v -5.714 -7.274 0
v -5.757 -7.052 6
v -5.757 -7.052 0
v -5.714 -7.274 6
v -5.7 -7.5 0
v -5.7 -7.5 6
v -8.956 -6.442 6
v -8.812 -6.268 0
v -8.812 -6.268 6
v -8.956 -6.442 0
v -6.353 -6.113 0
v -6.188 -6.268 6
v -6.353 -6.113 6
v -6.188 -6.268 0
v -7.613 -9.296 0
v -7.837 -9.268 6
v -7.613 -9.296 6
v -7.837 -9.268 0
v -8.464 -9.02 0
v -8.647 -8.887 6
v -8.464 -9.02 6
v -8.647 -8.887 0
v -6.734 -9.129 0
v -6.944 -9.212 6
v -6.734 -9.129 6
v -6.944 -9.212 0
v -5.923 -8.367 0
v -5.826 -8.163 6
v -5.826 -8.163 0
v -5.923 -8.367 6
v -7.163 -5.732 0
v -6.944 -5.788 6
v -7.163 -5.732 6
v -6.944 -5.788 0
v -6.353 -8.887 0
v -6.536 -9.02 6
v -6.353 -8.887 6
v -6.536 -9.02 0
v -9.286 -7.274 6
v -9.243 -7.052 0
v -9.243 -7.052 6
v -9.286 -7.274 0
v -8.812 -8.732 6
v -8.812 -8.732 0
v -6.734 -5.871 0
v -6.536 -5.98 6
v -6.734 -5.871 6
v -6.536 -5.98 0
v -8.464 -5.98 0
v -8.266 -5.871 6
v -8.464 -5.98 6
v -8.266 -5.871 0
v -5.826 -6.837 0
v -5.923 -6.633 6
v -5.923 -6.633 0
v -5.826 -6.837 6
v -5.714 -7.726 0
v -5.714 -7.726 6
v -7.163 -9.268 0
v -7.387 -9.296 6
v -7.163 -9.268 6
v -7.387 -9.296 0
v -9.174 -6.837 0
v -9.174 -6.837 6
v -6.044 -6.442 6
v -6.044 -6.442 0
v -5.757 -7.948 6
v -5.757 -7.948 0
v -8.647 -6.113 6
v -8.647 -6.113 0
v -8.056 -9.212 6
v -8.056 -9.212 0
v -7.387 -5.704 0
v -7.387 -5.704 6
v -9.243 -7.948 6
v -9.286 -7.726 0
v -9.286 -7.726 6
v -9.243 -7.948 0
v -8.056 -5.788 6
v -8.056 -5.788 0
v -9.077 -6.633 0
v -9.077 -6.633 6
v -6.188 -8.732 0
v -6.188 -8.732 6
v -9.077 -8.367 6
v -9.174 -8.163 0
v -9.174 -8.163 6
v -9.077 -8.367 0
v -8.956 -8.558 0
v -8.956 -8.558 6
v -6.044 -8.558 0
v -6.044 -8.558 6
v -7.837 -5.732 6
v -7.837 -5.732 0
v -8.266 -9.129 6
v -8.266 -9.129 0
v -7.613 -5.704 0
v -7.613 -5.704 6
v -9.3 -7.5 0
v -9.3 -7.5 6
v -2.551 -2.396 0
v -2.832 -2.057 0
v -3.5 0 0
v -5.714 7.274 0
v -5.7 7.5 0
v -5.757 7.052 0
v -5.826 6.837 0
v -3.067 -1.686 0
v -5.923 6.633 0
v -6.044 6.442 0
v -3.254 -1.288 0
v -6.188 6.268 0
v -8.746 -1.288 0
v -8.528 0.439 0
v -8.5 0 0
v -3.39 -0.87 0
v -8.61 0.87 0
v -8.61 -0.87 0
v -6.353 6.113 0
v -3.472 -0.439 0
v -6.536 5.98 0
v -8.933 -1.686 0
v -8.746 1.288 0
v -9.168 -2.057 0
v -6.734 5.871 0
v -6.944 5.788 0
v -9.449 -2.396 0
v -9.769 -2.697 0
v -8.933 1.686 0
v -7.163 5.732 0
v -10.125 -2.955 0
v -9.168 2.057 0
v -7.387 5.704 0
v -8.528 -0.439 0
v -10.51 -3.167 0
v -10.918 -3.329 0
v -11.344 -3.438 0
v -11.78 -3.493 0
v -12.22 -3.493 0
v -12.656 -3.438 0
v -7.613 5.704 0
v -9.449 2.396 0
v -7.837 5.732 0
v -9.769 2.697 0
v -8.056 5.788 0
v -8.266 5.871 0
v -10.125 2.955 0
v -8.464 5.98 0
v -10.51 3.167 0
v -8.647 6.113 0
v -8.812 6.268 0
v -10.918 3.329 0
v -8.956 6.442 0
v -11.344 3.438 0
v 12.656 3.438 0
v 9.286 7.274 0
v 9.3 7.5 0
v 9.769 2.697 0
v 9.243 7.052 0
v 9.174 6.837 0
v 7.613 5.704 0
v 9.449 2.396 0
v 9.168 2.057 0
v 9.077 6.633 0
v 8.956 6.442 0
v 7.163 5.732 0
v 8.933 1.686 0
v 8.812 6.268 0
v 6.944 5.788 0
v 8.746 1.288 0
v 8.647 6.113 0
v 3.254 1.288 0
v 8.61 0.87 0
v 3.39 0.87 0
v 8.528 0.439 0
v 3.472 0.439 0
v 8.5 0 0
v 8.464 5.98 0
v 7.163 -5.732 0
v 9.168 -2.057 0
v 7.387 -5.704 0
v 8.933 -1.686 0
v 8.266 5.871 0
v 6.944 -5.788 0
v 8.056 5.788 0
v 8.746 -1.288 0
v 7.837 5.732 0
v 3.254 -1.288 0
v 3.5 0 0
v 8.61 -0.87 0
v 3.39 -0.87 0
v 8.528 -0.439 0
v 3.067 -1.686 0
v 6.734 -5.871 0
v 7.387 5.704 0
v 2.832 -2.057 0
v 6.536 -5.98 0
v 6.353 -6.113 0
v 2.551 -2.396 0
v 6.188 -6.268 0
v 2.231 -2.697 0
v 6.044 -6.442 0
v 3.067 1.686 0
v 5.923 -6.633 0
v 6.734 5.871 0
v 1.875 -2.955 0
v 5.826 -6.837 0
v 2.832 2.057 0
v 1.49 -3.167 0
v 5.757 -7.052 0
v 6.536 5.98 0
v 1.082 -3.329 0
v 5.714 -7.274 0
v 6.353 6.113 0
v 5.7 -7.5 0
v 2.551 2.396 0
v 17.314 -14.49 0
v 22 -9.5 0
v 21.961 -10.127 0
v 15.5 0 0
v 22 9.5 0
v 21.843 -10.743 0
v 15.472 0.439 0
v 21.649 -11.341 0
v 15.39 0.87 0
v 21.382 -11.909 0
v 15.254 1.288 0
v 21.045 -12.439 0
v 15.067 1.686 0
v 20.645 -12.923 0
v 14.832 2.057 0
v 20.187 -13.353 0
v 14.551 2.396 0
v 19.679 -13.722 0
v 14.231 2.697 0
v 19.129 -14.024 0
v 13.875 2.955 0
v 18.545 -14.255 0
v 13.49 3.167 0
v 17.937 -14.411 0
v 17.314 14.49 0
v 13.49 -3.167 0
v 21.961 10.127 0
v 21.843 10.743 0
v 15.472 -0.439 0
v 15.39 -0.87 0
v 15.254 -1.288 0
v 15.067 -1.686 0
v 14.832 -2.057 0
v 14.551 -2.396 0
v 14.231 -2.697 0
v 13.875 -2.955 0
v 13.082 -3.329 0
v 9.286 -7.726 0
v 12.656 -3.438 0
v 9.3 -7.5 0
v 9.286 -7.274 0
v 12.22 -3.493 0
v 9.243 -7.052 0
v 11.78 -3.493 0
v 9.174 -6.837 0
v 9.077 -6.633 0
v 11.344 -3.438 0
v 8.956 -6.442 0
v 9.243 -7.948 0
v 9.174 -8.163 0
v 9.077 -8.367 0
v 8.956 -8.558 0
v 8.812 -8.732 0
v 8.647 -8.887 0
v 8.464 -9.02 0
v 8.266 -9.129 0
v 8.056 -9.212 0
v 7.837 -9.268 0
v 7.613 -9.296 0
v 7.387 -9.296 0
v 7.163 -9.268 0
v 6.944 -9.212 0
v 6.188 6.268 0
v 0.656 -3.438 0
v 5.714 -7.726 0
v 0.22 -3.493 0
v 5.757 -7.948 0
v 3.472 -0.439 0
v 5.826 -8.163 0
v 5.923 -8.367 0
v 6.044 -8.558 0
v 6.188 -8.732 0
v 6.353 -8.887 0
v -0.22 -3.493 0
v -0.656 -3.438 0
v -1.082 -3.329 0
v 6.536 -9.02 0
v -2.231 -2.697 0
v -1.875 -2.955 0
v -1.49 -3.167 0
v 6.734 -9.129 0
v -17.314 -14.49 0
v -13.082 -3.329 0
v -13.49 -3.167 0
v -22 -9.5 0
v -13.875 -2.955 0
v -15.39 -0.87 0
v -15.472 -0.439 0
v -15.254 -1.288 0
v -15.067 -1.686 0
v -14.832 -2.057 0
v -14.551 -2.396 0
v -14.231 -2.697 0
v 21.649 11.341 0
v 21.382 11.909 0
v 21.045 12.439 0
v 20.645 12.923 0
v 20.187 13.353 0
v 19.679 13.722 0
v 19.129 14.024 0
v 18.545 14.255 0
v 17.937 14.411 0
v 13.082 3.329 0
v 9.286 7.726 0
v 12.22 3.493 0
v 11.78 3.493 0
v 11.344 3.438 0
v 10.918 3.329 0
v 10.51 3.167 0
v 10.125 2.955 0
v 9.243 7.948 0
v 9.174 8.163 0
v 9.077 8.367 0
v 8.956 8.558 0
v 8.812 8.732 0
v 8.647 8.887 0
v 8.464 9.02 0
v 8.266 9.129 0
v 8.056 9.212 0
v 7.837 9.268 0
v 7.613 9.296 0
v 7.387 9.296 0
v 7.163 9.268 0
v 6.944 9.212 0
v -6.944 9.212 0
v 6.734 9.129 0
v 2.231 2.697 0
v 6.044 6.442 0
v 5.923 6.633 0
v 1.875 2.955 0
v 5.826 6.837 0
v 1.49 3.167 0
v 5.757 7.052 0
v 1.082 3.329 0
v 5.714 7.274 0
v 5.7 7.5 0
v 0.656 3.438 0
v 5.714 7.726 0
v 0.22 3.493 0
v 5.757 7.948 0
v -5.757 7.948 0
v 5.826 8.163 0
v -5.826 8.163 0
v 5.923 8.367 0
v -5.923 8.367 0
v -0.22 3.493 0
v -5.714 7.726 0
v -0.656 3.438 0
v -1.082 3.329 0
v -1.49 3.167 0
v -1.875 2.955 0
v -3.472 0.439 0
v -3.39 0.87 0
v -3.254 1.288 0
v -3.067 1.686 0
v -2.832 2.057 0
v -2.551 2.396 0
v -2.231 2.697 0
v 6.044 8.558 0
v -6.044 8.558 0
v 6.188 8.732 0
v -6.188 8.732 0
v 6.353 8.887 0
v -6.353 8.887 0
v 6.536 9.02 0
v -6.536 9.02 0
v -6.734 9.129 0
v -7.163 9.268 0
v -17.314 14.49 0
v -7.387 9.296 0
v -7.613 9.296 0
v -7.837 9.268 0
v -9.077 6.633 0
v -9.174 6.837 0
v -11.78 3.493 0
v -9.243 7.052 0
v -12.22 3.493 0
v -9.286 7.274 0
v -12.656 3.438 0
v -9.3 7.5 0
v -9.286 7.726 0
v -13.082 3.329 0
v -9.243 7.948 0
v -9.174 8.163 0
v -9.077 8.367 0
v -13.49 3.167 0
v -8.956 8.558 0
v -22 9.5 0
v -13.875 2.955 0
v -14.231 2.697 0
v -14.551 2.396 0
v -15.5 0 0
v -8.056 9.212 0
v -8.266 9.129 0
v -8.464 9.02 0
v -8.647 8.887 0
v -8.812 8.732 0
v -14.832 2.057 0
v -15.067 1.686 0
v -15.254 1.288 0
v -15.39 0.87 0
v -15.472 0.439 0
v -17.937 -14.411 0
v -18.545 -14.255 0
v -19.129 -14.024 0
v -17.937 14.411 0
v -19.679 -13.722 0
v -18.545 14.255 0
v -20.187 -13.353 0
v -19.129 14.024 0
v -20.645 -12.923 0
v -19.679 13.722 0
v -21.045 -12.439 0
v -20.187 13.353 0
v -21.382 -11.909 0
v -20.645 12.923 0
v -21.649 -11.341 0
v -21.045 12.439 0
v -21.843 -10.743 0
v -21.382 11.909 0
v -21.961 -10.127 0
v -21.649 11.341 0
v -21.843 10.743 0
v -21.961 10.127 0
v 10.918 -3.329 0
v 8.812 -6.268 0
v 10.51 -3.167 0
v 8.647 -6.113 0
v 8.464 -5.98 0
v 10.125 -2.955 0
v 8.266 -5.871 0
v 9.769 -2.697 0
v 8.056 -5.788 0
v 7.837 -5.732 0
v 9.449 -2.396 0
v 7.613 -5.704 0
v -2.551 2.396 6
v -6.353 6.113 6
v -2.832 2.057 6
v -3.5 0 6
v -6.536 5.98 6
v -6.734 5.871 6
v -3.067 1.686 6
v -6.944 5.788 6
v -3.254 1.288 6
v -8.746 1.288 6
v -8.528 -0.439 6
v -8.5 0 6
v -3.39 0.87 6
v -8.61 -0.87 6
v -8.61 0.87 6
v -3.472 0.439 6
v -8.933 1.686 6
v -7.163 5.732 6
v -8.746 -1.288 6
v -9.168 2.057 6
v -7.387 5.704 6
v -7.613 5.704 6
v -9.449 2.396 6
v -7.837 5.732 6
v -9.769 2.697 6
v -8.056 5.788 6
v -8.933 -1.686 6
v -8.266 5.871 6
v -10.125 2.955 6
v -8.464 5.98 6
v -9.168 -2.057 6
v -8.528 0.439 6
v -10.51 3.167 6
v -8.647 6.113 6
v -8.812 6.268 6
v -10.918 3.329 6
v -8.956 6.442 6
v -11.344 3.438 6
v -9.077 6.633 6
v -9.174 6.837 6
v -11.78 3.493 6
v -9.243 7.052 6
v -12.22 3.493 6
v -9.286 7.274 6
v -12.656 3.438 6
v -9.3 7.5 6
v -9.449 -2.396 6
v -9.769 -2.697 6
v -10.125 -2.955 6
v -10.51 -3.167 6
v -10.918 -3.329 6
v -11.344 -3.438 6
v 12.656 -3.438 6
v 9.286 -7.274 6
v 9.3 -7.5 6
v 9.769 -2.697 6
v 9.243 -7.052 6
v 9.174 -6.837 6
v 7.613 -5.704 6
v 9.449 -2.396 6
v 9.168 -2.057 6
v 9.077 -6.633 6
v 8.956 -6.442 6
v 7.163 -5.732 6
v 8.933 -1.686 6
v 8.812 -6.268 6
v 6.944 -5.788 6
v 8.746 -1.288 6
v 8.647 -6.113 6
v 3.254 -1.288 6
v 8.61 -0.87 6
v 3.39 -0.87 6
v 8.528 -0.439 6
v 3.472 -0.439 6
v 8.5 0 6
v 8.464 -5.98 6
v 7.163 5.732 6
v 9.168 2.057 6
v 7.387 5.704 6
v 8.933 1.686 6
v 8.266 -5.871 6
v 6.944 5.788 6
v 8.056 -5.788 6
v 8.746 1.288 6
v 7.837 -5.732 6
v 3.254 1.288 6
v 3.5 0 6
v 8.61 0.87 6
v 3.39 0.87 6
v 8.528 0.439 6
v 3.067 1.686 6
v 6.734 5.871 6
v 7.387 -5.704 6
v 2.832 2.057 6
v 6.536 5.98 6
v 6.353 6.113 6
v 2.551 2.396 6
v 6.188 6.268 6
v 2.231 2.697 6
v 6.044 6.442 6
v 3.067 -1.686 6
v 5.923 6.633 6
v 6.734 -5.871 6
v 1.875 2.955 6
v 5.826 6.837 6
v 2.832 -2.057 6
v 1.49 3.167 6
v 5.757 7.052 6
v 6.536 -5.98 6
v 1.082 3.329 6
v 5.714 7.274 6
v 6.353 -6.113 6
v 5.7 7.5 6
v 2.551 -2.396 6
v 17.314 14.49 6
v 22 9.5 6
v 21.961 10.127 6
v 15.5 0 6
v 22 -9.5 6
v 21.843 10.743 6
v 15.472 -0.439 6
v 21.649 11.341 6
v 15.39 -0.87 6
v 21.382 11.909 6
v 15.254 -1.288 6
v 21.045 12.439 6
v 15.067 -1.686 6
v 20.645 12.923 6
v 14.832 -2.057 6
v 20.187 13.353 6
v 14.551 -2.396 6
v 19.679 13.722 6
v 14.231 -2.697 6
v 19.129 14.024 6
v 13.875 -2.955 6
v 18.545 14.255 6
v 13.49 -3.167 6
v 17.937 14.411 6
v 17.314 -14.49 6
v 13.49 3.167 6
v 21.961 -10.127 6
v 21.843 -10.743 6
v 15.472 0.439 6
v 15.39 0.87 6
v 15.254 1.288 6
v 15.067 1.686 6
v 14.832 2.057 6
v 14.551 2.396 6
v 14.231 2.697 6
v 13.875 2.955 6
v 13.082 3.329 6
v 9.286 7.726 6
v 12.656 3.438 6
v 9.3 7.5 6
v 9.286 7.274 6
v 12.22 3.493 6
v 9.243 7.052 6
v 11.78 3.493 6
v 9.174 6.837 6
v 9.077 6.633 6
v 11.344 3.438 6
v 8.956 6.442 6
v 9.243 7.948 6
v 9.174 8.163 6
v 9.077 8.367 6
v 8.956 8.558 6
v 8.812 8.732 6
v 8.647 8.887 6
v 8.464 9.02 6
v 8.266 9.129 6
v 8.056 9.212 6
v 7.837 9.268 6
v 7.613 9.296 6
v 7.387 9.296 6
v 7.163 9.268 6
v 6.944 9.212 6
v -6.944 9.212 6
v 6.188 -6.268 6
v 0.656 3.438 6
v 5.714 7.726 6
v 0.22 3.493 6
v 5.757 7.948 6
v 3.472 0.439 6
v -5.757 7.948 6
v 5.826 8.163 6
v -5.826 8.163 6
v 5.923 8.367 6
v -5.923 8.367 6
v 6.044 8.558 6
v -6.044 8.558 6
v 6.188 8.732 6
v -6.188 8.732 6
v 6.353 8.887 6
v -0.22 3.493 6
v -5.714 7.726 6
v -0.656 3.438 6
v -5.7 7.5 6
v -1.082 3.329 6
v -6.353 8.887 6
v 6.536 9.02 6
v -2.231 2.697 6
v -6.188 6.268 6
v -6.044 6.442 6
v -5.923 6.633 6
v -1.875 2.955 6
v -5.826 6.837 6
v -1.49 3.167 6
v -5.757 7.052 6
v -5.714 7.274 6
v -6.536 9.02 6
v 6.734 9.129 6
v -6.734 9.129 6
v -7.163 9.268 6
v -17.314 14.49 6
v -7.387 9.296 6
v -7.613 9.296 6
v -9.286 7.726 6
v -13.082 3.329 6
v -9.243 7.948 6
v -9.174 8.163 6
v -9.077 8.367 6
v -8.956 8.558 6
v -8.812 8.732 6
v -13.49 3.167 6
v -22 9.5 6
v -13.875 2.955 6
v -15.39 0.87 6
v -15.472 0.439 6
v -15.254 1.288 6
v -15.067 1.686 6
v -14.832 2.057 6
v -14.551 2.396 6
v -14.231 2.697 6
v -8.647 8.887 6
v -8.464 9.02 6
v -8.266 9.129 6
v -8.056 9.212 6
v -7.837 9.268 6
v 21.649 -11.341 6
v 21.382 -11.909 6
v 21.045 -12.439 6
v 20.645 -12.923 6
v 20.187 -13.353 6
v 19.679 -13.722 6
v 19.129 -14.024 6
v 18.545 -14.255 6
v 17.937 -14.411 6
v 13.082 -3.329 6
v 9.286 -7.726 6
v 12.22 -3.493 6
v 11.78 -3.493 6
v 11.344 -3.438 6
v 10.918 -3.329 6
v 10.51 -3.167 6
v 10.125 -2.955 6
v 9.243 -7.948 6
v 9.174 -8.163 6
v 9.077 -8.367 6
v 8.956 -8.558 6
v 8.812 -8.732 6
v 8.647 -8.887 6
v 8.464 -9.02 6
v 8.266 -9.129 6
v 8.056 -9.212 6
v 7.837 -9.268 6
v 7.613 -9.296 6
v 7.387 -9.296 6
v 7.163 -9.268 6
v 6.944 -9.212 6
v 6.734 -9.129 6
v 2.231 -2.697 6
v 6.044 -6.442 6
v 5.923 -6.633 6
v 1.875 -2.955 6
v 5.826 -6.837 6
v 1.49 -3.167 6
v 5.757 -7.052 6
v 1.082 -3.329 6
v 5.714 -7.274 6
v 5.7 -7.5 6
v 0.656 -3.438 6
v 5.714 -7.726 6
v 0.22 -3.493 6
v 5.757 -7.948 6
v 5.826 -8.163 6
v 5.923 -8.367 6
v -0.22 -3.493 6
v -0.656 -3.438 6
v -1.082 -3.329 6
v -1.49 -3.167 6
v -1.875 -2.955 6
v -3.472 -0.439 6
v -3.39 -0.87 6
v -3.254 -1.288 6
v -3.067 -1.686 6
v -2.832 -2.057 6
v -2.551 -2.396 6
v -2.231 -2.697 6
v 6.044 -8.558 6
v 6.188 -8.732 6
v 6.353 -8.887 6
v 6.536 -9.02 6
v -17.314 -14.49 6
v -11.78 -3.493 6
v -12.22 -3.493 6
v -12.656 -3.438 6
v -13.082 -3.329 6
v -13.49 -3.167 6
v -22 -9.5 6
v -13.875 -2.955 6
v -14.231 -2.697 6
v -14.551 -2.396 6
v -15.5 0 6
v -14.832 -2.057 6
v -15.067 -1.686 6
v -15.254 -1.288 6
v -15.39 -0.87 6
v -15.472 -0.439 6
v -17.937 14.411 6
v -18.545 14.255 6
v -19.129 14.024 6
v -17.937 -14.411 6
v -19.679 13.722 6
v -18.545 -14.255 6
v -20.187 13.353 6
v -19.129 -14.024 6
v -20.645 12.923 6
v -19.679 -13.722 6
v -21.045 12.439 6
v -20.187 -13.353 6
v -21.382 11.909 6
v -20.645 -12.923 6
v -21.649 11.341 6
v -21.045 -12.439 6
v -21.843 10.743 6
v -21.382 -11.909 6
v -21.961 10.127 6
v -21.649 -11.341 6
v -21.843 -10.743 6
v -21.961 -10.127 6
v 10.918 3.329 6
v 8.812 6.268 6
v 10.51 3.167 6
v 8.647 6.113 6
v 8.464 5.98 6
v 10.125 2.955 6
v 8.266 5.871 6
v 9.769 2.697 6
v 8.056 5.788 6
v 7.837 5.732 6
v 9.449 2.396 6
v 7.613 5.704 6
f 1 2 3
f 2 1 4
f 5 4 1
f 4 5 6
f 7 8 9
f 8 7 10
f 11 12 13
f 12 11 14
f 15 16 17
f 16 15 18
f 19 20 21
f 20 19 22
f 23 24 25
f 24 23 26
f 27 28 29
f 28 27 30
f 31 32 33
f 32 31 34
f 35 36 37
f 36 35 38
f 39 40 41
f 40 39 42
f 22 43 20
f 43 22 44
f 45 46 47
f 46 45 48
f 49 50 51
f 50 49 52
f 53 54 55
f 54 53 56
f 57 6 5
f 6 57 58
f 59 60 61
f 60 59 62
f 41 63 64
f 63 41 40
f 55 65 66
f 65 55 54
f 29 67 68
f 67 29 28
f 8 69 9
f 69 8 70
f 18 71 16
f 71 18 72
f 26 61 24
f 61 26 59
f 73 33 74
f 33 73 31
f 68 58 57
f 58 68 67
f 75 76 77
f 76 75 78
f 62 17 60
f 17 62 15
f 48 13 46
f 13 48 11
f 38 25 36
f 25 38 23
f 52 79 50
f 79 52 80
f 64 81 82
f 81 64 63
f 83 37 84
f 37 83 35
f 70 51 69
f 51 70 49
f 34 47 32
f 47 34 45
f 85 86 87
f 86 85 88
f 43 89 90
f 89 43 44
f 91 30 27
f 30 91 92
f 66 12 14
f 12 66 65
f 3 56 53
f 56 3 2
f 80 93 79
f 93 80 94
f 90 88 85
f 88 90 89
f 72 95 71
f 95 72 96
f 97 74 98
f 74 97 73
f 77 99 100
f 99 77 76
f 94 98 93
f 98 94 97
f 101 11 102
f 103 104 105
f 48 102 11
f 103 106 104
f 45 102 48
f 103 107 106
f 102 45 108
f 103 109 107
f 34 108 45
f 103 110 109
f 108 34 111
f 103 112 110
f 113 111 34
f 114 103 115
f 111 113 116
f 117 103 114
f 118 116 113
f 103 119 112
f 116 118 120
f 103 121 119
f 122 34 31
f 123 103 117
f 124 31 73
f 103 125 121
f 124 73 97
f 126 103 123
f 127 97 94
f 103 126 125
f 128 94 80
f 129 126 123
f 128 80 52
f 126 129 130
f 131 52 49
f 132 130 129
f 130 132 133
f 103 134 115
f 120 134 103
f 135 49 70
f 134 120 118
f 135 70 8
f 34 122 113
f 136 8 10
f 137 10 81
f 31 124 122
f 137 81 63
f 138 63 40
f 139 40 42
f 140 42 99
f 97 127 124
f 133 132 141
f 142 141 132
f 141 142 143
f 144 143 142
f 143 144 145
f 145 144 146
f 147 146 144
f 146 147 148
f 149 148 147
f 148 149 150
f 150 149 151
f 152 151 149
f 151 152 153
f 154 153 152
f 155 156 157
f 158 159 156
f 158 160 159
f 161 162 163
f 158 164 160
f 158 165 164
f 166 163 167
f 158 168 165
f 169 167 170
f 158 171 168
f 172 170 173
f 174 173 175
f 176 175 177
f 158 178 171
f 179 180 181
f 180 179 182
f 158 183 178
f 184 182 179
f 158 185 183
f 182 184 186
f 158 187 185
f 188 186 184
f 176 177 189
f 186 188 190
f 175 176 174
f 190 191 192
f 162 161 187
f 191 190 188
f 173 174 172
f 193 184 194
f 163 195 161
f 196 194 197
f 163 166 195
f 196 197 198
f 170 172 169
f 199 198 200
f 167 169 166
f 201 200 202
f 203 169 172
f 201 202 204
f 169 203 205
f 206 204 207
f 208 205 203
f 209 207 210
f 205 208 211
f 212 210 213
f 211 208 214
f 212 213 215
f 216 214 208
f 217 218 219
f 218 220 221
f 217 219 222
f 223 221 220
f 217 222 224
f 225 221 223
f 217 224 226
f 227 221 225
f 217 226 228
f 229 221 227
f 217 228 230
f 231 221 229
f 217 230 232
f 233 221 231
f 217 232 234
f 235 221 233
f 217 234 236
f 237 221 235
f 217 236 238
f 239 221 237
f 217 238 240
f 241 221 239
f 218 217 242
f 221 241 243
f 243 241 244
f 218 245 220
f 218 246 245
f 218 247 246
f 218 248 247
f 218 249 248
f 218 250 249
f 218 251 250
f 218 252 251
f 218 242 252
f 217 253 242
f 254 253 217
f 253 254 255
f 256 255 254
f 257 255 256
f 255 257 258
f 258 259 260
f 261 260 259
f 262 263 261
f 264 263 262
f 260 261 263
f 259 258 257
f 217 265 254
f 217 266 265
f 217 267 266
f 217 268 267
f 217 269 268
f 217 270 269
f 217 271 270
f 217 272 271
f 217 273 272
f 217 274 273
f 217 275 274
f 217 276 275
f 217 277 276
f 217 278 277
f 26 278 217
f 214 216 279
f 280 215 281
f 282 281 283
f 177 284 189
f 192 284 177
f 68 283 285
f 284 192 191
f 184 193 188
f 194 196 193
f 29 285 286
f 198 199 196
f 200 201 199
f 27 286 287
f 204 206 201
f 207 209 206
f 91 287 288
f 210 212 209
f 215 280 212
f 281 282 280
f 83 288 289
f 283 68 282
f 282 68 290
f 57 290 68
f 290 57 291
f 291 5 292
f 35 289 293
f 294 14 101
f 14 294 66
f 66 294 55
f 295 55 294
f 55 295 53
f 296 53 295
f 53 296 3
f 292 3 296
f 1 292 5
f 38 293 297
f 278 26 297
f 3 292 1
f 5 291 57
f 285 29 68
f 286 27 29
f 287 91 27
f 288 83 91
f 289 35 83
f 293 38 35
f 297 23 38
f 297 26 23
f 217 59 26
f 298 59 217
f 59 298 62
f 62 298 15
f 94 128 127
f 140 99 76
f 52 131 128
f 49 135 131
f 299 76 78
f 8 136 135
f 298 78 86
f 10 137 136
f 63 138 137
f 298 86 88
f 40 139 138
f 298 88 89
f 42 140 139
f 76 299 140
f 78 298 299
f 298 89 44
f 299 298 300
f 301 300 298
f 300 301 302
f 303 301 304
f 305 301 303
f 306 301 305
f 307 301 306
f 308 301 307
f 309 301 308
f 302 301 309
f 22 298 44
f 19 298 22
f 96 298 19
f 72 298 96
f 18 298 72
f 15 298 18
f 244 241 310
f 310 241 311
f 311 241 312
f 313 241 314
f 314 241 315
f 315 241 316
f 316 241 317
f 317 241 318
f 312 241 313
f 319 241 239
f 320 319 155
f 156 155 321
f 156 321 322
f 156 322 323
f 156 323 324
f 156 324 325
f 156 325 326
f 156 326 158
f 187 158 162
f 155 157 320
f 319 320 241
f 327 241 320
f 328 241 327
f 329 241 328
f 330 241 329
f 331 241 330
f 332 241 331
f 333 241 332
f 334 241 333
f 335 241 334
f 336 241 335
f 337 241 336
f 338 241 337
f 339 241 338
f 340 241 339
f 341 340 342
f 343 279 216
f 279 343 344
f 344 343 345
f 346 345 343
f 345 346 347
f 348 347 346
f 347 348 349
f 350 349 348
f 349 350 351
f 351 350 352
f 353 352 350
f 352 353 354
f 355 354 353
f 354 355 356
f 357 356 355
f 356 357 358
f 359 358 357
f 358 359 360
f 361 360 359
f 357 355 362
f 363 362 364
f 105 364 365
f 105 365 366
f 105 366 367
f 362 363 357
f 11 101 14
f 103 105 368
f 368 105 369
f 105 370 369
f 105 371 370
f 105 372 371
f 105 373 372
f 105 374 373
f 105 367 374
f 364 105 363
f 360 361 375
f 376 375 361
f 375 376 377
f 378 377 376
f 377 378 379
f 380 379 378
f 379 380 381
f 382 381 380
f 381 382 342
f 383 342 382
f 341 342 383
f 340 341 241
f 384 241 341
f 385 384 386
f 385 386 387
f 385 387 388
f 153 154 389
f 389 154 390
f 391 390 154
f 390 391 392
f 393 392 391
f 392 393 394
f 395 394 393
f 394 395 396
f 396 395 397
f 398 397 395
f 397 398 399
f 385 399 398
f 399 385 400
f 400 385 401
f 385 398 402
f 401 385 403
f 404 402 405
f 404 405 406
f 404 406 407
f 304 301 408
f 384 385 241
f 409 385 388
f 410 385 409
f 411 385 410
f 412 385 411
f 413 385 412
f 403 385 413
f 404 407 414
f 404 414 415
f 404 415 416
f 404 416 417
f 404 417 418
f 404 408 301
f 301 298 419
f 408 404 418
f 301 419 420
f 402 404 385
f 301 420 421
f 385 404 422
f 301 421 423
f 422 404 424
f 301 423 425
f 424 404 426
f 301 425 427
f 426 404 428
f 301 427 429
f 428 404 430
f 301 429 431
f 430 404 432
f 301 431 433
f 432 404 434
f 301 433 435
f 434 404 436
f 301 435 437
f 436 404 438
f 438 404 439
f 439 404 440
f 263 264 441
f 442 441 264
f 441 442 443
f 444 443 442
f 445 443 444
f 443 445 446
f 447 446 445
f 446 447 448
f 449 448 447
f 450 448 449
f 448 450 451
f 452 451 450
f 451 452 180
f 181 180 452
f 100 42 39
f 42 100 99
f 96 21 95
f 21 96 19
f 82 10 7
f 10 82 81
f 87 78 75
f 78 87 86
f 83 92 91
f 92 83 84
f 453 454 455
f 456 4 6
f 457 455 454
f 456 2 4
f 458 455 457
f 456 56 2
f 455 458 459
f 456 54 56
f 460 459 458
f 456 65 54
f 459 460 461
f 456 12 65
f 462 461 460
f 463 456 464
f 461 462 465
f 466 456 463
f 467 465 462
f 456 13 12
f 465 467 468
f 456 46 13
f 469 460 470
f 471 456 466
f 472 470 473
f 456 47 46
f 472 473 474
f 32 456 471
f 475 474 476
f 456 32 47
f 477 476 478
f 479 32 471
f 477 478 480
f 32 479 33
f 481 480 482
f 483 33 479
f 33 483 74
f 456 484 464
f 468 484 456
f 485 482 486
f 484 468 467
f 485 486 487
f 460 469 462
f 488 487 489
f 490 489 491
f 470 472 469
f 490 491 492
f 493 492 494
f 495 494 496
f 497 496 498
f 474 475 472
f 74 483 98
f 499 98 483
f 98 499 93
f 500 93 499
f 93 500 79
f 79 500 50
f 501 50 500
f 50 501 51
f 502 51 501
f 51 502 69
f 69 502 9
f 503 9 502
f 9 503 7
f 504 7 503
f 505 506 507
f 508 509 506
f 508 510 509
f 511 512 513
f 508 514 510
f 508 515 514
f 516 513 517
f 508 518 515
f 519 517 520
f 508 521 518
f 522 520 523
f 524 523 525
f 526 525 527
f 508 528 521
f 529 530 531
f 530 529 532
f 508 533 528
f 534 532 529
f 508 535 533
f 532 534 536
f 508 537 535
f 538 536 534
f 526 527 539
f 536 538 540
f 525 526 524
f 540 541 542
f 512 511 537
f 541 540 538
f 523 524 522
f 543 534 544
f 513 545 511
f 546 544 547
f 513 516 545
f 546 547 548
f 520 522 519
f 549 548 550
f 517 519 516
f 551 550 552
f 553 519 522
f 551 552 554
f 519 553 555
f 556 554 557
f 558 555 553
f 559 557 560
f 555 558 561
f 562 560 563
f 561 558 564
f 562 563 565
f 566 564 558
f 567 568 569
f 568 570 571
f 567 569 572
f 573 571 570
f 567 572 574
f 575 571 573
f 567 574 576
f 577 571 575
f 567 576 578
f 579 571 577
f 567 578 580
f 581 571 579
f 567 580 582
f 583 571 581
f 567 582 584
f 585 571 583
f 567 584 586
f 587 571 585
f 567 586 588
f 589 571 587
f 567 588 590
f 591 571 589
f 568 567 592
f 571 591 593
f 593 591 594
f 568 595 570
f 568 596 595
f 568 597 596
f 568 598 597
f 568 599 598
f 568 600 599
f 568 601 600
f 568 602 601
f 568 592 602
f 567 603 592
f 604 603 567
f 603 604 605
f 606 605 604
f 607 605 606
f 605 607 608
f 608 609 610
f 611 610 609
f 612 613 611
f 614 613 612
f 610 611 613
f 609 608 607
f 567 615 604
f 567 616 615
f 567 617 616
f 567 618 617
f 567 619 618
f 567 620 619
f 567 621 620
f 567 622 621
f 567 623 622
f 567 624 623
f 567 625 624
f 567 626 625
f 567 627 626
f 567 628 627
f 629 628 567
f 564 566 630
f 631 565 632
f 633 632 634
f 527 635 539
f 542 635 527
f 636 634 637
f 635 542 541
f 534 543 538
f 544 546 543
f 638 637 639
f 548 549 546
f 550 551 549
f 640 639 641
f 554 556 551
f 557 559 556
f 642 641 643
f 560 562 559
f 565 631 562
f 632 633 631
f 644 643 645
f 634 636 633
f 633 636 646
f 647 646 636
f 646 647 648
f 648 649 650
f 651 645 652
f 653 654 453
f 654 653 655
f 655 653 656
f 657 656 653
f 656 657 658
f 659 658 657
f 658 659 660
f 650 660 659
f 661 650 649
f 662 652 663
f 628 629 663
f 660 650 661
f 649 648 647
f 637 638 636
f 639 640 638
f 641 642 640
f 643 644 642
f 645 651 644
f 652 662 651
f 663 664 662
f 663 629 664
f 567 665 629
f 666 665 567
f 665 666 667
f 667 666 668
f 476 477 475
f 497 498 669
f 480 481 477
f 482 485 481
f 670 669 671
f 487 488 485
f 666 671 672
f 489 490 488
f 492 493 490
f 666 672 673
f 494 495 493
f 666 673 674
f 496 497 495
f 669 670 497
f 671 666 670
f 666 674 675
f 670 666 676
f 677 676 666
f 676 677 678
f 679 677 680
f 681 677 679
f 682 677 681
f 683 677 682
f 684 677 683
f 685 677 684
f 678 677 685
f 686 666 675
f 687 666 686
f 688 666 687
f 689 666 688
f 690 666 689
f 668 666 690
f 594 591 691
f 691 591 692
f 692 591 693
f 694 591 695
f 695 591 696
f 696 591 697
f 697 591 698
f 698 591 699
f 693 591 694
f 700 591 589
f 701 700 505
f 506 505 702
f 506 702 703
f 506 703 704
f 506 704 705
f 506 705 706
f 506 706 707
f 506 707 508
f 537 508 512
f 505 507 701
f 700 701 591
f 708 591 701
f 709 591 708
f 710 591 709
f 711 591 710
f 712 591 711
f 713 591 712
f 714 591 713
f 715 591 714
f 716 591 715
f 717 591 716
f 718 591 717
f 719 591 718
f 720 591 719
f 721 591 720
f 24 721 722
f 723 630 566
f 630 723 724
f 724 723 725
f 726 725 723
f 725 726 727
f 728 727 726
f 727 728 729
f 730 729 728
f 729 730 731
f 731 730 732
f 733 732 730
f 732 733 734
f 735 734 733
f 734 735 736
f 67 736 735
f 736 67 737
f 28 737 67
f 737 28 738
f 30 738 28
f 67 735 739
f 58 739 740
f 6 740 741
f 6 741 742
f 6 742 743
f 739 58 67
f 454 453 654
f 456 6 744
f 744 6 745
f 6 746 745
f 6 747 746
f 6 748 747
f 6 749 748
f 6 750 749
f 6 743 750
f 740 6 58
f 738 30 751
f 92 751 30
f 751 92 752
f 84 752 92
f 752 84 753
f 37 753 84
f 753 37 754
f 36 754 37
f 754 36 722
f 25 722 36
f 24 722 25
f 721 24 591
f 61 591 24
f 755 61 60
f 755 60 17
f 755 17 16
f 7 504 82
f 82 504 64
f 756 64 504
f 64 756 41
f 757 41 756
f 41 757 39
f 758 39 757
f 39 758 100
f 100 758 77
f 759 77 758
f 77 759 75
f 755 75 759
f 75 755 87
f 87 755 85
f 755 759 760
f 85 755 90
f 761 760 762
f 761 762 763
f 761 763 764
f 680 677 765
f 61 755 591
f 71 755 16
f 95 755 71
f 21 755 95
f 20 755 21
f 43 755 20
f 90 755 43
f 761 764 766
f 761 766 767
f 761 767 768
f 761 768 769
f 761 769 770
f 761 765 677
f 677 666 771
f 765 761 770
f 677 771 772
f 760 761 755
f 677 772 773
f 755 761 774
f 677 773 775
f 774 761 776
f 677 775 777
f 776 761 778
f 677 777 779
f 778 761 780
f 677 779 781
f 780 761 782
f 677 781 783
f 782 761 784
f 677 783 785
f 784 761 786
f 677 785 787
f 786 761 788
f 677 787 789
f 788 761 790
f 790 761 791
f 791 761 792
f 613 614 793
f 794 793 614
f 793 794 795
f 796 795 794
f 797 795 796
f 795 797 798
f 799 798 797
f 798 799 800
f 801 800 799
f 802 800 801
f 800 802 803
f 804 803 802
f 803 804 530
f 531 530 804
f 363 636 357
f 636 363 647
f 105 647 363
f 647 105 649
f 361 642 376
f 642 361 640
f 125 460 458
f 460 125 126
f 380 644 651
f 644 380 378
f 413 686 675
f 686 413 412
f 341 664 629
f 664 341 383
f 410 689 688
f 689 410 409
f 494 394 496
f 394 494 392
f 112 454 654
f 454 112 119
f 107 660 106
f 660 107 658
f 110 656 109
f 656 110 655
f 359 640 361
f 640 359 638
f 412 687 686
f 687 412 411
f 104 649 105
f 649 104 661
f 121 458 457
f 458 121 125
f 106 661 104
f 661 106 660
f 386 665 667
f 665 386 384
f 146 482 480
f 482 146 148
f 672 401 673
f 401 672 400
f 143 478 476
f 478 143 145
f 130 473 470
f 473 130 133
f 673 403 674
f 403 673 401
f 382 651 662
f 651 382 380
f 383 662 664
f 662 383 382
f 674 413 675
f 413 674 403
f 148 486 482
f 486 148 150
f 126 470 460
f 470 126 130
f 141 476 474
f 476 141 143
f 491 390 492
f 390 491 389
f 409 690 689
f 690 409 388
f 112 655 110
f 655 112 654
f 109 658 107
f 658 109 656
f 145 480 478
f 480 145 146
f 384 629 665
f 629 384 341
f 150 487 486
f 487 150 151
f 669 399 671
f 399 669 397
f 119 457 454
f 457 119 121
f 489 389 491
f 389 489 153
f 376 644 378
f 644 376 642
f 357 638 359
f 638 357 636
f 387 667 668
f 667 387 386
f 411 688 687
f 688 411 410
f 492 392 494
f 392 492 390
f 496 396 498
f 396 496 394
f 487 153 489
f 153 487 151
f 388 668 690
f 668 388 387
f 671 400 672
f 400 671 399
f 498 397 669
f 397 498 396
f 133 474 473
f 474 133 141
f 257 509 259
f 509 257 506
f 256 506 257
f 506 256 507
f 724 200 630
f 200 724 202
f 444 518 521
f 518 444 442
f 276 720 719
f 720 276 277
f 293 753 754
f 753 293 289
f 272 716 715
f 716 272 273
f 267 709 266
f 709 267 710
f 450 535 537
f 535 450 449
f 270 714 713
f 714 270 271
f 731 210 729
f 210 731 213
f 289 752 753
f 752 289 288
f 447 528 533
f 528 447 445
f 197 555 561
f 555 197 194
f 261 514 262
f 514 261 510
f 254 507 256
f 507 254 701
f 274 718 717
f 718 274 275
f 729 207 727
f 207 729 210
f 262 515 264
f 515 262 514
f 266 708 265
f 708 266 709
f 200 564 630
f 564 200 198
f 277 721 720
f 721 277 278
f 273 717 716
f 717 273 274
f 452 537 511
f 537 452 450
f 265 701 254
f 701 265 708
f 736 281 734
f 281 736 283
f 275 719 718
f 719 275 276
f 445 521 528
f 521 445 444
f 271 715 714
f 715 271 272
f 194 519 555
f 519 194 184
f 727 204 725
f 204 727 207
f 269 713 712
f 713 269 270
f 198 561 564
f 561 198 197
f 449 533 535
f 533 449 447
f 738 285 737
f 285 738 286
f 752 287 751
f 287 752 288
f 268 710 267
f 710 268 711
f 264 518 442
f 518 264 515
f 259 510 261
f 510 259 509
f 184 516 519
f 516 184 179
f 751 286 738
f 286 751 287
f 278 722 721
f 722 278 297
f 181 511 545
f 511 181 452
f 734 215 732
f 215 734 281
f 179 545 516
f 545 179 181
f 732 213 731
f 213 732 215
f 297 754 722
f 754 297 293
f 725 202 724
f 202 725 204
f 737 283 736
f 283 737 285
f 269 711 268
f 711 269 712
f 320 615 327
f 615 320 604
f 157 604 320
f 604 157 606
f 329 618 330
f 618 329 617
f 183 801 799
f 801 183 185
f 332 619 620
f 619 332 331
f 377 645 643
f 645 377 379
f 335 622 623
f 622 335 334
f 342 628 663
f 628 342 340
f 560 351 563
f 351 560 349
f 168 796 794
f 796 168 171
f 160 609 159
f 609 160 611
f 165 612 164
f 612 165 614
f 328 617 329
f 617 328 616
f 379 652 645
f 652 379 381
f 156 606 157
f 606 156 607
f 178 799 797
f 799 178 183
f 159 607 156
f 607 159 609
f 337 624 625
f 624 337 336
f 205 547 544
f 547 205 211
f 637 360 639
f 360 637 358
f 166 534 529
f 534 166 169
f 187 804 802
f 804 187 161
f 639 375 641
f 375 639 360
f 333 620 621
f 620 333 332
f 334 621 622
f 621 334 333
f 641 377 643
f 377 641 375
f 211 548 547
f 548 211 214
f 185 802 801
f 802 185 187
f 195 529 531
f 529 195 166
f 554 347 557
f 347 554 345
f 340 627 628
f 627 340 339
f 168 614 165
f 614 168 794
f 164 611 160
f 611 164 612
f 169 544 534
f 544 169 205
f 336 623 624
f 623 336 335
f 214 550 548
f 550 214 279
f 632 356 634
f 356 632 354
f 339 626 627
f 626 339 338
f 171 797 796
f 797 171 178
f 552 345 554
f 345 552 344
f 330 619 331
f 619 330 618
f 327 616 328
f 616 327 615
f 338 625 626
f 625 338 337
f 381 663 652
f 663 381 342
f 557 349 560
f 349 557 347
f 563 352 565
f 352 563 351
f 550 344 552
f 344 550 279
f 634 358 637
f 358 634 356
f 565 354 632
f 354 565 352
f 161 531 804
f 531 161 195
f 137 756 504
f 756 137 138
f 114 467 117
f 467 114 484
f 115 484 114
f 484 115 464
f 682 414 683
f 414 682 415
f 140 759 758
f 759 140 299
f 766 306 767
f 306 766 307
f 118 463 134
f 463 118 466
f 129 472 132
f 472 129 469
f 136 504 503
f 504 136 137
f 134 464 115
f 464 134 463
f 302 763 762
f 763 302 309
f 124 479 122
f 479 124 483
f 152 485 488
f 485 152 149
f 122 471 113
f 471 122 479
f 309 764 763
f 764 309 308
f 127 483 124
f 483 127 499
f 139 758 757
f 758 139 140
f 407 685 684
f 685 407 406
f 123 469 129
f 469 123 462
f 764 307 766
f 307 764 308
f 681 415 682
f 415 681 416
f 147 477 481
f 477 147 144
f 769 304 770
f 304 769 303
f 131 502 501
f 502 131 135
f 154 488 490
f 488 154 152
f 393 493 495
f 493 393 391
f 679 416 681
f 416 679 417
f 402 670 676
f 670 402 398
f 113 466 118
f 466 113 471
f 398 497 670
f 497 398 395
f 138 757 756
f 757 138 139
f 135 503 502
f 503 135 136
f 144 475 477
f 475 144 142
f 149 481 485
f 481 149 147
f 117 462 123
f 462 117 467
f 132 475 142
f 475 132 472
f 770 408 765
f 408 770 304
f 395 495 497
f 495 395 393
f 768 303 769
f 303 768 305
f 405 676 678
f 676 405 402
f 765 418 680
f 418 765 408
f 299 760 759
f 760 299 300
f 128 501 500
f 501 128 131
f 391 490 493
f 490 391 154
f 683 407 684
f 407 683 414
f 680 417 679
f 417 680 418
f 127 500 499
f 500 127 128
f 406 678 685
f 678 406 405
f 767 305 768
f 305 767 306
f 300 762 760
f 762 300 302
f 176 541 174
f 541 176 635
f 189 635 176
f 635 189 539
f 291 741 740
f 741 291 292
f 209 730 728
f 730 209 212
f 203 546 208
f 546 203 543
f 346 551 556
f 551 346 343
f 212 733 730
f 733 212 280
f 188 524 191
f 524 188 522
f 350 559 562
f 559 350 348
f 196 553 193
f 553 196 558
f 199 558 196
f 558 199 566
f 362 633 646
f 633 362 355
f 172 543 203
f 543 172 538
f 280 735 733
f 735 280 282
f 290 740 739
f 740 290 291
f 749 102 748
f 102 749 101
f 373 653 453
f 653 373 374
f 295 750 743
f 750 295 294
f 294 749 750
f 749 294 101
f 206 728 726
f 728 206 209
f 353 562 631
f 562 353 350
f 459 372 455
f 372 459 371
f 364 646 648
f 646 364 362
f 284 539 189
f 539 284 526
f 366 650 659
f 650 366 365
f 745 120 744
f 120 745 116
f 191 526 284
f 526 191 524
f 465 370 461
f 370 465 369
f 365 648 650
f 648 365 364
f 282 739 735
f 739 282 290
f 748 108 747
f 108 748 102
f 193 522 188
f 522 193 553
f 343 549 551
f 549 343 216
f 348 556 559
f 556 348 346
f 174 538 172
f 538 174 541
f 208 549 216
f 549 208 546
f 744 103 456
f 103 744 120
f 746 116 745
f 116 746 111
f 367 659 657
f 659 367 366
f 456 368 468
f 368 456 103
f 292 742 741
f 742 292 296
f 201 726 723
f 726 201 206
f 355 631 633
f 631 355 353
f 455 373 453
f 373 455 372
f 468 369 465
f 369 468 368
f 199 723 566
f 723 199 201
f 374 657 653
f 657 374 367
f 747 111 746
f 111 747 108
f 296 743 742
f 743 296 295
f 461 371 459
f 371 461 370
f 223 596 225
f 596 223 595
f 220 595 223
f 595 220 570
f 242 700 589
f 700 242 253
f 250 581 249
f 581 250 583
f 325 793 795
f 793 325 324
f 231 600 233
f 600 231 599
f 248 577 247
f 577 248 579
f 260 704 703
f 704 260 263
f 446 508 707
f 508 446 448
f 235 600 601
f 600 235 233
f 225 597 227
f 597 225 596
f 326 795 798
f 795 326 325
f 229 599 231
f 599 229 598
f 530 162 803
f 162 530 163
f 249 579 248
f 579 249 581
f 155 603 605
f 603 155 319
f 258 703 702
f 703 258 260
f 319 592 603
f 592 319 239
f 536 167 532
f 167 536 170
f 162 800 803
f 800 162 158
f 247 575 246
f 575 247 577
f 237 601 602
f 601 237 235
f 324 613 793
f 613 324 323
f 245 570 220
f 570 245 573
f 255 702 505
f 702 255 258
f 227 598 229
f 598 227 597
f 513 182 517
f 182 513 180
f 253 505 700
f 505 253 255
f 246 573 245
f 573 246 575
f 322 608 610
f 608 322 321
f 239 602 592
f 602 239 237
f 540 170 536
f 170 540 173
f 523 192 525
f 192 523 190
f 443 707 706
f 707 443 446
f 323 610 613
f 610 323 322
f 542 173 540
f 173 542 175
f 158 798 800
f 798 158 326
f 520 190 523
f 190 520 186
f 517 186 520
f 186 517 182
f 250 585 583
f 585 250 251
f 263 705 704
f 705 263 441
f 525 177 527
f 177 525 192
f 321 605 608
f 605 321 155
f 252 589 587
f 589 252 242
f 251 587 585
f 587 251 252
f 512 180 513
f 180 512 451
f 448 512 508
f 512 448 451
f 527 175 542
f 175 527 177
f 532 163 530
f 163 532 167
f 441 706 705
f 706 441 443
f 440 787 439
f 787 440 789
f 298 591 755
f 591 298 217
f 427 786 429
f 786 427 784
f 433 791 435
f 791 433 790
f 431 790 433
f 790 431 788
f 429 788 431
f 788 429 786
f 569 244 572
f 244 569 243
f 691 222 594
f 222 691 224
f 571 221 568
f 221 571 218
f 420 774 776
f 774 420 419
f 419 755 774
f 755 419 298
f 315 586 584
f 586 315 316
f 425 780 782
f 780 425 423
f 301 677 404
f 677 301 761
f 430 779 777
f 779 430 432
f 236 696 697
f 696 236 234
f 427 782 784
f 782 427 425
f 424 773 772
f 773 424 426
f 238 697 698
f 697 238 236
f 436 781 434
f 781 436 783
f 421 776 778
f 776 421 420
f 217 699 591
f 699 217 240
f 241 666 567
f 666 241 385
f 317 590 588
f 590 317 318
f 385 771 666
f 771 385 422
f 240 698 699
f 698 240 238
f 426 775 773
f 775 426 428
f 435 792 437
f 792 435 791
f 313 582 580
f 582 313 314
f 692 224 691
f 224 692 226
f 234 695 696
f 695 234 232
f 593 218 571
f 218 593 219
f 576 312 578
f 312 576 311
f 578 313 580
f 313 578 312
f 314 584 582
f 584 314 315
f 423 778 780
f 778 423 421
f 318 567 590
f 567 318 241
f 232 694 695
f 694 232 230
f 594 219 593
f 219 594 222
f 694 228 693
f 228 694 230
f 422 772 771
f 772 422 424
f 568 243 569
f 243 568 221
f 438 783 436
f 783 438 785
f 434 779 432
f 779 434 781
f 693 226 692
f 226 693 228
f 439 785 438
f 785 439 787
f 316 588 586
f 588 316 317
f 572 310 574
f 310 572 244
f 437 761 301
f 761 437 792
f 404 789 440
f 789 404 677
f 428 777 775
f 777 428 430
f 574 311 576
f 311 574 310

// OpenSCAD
$fn = 50;

difference() {
	union() {
		hull() {
			translate(v = [-17.0, 9.5, 0]) {
				cylinder(h = 6, r = 5);
			}
			translate(v = [17.0, 9.5, 0]) {
				cylinder(h = 6, r = 5);
			}
			translate(v = [-17.0, -9.5, 0]) {
				cylinder(h = 6, r = 5);
			}
			translate(v = [17.0, -9.5, 0]) {
				cylinder(h = 6, r = 5);
			}
		}
	}
	union() {
		translate(v = [-7.5, -7.5, 0]) {
			cylinder(h = 6, r = 1.8);
		}
		translate(v = [-7.5, 7.5, 0]) {
			cylinder(h = 6, r = 1.8);
		}
		translate(v = [7.5, -7.5, 0]) {
			cylinder(h = 6, r = 1.8);
		}
		translate(v = [7.5, 7.5, 0]) {
			cylinder(h = 6, r = 1.8);
		}
		translate(v = [-12.0, 0, 0.0]) {
			cylinder(h = 6, r = 3.5);
		}
		cylinder(h = 6, r = 3.5);
		translate(v = [12.0, 0, 0.0]) {
			cylinder(h = 6, r = 3.5);
		}
	}
}
